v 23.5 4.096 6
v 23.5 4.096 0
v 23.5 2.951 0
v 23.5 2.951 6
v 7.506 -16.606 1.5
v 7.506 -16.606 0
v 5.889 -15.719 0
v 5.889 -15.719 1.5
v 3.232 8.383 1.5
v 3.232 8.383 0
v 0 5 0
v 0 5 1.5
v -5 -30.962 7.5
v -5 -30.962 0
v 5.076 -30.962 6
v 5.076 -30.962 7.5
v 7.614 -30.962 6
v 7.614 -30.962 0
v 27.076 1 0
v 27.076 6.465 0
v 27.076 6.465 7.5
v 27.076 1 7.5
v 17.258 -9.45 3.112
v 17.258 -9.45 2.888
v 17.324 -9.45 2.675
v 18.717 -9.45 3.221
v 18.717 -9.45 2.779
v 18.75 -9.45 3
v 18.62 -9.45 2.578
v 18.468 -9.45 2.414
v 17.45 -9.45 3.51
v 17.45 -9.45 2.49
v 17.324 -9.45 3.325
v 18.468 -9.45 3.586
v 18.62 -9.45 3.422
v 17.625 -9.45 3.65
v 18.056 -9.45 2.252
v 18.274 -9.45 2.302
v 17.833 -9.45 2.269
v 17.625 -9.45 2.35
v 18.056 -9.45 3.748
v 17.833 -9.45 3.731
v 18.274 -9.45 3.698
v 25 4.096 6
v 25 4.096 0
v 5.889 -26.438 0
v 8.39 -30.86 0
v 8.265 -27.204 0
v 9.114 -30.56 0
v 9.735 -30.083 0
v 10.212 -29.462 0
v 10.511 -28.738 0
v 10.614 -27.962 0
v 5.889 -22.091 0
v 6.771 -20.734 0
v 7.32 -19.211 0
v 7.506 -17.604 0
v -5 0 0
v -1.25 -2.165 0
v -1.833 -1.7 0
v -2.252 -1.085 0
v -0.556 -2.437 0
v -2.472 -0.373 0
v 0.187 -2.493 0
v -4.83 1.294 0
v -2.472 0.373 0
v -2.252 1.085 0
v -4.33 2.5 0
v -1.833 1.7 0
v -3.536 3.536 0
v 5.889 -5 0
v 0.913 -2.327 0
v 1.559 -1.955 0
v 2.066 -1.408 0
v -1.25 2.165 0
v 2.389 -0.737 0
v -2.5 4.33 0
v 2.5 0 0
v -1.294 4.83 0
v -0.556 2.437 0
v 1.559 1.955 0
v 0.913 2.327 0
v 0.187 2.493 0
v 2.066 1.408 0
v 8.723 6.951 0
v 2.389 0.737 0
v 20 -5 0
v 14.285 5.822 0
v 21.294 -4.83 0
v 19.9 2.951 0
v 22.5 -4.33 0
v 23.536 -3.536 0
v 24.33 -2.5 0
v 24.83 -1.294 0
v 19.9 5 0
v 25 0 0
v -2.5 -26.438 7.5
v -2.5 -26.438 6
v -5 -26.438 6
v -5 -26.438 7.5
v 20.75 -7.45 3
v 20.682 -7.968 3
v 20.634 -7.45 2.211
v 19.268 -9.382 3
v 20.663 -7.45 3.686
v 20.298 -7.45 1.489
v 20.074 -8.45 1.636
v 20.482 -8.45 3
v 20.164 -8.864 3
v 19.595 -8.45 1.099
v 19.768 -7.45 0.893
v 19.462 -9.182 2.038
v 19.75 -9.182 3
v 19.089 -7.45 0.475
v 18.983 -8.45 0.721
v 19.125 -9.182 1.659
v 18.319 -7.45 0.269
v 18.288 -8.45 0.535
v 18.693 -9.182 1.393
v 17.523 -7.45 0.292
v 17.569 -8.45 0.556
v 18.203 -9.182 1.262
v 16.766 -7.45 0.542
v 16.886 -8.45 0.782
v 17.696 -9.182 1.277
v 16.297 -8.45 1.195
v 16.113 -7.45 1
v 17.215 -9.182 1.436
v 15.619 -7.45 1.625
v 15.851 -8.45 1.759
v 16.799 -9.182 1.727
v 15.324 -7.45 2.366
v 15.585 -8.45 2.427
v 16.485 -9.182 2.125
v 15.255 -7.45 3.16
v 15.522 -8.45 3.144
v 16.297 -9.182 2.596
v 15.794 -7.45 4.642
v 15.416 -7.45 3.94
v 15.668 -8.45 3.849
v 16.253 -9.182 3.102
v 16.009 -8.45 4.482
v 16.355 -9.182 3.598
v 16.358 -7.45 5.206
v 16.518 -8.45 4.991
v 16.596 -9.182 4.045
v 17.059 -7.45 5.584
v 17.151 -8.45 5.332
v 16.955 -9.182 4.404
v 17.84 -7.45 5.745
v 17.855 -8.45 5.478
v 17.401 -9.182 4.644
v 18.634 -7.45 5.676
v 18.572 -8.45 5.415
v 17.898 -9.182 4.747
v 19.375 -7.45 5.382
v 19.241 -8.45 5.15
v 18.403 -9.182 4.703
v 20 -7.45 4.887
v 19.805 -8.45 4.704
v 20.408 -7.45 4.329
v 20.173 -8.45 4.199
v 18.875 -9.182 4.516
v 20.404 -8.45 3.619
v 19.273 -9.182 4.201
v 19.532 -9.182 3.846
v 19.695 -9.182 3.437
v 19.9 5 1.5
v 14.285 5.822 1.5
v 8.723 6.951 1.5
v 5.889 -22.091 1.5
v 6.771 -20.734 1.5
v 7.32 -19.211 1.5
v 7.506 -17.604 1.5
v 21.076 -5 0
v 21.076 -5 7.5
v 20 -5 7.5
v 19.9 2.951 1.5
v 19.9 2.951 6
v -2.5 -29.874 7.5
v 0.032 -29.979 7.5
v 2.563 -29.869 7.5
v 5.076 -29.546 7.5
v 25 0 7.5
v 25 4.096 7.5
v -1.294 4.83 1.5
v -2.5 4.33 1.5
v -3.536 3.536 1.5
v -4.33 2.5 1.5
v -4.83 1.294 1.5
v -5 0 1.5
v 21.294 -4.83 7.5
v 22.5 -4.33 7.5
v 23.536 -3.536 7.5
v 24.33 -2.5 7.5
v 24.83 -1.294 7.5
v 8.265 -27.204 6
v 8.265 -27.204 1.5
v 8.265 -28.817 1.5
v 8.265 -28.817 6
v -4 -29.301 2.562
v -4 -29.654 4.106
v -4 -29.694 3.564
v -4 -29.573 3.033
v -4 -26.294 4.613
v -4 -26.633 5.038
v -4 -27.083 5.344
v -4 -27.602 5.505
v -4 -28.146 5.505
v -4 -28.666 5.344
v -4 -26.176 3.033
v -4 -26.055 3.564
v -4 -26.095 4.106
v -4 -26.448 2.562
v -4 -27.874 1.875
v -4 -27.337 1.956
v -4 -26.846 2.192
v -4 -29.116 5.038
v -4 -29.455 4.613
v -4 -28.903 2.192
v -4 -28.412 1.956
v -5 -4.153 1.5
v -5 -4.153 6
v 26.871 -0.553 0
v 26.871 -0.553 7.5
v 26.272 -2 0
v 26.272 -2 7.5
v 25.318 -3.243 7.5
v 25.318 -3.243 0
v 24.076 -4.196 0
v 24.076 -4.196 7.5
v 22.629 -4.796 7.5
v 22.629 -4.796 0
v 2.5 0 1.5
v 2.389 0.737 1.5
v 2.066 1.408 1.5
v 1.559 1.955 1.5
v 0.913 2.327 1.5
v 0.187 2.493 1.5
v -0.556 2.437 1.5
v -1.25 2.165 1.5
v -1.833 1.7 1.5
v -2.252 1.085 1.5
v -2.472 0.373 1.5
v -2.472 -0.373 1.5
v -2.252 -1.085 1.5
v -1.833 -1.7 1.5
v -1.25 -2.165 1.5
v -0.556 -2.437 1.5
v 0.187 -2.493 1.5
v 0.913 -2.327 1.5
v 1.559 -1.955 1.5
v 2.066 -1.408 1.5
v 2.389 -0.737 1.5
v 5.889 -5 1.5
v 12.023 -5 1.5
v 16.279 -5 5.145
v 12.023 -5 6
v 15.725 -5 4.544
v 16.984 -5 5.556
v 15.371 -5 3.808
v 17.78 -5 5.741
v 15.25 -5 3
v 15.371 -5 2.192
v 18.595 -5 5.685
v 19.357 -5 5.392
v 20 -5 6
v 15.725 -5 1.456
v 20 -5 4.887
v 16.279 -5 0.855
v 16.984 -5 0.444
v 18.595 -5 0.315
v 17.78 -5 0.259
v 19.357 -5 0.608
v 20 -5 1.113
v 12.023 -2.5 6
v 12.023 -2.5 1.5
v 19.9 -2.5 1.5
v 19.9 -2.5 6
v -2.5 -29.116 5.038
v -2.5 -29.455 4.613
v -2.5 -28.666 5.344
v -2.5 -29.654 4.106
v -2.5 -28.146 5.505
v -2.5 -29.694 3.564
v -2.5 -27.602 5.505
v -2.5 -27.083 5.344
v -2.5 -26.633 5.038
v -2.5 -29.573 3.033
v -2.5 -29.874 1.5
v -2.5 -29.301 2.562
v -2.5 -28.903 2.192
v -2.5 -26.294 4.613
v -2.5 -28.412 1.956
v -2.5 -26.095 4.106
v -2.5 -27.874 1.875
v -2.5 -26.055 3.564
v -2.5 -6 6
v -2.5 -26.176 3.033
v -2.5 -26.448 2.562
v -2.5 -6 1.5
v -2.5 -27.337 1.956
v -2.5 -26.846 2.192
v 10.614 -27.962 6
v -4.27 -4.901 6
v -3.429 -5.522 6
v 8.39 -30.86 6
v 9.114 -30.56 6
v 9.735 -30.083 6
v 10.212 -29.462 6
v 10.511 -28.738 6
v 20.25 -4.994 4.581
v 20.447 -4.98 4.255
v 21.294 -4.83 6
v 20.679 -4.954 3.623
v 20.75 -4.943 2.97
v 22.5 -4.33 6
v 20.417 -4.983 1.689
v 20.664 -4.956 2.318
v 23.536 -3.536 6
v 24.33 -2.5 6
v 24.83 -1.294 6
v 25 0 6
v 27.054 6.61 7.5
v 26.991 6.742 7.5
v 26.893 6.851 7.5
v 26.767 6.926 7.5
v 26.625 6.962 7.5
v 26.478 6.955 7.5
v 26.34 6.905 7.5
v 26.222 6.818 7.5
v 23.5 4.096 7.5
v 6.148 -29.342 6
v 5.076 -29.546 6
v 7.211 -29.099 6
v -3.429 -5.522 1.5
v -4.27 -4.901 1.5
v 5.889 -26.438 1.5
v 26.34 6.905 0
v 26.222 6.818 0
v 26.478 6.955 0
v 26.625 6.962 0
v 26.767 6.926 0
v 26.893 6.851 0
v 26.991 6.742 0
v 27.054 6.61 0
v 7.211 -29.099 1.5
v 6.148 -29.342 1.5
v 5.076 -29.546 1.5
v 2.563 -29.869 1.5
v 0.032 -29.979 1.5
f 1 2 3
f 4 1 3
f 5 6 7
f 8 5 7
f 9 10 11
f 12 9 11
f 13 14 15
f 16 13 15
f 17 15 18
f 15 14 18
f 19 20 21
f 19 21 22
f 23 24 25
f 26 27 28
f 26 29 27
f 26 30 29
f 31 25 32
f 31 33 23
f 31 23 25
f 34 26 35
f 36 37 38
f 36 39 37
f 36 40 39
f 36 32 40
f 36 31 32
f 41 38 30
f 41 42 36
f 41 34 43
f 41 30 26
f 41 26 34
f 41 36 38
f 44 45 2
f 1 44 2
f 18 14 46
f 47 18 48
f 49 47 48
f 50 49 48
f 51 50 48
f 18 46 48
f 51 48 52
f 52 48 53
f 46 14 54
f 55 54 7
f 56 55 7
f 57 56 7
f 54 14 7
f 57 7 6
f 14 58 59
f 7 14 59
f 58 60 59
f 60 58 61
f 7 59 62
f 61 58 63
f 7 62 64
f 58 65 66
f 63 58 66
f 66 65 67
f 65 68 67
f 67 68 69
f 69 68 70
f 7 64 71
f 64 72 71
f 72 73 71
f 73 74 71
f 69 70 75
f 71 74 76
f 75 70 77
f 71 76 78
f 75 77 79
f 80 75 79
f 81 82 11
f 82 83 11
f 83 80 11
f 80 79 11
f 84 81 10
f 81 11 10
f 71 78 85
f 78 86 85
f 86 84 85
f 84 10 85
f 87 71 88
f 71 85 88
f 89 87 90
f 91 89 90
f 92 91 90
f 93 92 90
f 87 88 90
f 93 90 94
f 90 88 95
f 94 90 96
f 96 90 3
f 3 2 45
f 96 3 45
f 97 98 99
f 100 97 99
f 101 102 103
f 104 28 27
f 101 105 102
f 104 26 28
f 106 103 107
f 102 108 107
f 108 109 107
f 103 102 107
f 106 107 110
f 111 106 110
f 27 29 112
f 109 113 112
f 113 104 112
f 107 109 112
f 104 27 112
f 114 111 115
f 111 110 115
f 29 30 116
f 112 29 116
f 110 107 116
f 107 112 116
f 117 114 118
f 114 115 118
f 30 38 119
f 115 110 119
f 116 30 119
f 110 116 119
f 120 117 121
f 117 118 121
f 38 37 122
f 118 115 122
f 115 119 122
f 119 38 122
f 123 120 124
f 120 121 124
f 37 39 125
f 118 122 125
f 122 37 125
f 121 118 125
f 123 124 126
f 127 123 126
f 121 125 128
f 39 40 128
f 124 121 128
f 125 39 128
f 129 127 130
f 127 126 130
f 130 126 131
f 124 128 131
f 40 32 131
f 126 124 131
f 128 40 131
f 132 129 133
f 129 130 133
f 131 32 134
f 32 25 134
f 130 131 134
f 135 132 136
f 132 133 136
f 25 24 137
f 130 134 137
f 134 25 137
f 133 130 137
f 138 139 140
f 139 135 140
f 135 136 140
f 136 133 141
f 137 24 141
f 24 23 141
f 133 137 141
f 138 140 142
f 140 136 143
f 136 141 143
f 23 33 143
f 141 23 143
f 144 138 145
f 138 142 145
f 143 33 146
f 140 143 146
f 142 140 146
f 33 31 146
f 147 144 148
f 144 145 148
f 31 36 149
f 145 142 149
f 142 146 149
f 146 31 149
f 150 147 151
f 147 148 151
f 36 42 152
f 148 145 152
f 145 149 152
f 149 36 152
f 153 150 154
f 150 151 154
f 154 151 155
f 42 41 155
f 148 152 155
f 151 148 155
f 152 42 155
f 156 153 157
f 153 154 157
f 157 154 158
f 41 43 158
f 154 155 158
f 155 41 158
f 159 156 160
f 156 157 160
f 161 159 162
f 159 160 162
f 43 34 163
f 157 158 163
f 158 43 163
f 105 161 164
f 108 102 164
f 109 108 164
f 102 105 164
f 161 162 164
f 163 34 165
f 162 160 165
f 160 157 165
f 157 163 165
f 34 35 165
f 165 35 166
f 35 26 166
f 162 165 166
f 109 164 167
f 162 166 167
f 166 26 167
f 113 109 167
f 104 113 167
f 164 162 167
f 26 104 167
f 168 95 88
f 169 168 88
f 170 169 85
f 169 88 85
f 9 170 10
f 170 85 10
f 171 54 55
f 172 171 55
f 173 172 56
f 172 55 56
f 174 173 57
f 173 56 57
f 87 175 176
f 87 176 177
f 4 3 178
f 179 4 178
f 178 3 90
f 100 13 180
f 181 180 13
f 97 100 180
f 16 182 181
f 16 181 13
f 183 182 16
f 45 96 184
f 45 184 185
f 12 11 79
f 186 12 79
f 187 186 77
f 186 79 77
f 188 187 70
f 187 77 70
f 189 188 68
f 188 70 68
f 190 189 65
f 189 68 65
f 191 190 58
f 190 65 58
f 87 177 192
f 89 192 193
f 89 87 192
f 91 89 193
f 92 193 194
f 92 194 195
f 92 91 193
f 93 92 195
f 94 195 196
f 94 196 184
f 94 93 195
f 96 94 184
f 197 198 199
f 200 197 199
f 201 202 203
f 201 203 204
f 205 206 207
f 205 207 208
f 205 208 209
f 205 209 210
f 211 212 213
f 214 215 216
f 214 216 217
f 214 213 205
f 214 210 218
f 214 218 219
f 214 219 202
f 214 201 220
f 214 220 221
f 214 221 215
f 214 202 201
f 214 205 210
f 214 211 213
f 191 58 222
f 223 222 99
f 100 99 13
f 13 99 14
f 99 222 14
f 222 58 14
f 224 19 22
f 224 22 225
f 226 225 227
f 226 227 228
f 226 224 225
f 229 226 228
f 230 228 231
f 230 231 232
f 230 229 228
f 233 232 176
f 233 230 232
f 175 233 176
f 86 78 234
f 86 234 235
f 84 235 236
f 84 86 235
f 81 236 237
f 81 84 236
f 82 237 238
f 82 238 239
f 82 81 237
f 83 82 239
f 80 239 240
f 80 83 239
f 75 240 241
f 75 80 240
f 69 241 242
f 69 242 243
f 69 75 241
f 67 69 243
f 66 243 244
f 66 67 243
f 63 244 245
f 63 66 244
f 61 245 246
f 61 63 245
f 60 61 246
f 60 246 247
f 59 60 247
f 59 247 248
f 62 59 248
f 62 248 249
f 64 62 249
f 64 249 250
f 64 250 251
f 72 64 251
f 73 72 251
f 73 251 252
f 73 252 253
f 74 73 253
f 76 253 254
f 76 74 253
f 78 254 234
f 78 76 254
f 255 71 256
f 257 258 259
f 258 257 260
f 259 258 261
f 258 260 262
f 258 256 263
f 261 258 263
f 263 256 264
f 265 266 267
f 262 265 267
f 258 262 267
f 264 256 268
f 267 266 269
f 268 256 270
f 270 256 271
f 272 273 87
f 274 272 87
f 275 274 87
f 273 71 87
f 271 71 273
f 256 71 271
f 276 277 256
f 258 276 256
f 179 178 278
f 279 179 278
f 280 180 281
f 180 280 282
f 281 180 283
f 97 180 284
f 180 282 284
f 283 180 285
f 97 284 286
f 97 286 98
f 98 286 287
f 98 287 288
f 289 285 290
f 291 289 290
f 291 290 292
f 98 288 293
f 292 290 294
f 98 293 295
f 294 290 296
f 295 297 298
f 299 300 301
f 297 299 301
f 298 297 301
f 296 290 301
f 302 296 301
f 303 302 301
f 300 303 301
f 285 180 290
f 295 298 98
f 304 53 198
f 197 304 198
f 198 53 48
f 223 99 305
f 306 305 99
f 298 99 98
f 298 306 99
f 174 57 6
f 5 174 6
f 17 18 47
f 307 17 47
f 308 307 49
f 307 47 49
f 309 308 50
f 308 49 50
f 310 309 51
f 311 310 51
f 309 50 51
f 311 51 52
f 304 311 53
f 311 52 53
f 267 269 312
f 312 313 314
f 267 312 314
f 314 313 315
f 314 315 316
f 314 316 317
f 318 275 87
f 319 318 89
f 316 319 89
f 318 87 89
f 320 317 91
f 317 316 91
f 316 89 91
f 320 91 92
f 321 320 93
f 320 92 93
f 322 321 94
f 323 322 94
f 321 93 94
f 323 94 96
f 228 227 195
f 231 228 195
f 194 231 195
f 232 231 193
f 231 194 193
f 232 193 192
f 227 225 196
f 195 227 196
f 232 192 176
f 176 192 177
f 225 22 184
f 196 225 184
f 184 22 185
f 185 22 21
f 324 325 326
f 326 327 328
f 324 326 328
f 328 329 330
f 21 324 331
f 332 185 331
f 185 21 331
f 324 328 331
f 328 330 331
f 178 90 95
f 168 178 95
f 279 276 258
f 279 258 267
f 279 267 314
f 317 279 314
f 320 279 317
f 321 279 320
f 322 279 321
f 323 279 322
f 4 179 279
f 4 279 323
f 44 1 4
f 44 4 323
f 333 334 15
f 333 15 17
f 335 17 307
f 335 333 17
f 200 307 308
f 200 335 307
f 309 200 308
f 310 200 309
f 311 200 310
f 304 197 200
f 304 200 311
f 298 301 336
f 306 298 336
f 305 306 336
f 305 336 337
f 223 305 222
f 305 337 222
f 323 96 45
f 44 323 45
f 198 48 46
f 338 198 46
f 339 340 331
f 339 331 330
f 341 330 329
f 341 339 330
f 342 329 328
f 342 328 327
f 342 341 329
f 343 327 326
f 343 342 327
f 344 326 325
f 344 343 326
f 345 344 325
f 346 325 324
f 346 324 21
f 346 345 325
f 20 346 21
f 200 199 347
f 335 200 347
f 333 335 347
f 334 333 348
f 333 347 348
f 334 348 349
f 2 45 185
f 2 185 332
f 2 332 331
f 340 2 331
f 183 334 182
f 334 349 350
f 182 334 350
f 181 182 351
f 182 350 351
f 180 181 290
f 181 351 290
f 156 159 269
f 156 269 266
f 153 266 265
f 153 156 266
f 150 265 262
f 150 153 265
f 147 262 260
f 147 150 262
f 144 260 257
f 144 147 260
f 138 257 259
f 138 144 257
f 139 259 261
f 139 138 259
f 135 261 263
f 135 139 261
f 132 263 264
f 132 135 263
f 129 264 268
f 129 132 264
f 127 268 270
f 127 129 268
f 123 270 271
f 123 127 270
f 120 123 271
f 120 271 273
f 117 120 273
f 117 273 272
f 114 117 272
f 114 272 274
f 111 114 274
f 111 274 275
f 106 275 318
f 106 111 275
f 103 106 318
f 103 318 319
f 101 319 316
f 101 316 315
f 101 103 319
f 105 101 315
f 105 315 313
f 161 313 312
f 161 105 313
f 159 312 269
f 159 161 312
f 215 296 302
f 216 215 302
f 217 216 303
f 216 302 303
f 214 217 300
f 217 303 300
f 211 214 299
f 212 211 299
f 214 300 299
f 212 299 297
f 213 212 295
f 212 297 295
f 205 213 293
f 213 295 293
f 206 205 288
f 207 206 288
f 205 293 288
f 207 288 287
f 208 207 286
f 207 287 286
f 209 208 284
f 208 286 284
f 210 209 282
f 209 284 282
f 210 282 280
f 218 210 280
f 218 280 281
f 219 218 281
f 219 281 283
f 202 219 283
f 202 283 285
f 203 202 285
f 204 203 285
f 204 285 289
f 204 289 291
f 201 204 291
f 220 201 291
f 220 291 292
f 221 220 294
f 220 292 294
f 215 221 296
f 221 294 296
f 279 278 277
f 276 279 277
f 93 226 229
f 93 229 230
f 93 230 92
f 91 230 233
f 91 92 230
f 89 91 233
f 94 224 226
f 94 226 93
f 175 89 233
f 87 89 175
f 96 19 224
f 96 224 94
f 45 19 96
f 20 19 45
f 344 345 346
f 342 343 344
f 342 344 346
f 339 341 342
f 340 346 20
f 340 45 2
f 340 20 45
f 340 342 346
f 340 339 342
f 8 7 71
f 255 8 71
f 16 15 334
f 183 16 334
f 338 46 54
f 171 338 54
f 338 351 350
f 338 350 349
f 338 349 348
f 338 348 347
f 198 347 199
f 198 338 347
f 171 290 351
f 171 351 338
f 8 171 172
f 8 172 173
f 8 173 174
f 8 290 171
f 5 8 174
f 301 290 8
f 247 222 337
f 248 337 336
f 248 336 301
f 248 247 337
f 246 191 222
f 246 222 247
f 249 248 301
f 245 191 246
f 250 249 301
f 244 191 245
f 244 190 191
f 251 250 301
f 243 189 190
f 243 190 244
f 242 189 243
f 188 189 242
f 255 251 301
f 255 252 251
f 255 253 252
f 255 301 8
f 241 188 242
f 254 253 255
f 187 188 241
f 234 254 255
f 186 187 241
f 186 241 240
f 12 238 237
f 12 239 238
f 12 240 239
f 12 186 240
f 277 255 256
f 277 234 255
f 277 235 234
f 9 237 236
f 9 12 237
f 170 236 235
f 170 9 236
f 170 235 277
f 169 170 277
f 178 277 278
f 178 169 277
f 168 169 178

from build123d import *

# Parameters (mm, degrees)
EXTRUDE_3_DEPTH     = 7.5
EXTRUDE_3_2_DEPTH   = 7.5
EXTRUDE_4_DEPTH     = 6
SKETCH_1_8_R        = 2.5
EXTRUDE_5_DEPTH     = 1.5
SKETCH_2_R          = 2.75
EXTRUDE_6_DEPTH     = 2.45
SKETCH_4_R          = 2.75
EXTRUDE_7_DEPTH     = 2
SKETCH_5_R          = 1.825
CUT_EXTRUDE_1_DEPTH = 1.5


with BuildPart() as part:
    # 스케치1 → 보스-돌출3 (new body)
    with BuildSketch(Plane.XY):
        with BuildLine():
            Line((-2.5, -26.437677825), (-5, -26.437677825))
            Line((-5, -26.437677825), (-5, -30.96175738))
            Line((-5, -30.96175738), (5.076141326, -30.96175738))
            Line((5.076141326, -30.96175738), (5.076141326, -29.54601506))
            ThreePointArc((5.076141326, -29.54601506), (1.298498135, -29.950761581), (-2.5, -29.874474333))
            Line((-2.5, -29.874474333), (-2.5, -26.437677825))
        make_face()
    extrude(amount=EXTRUDE_3_DEPTH)

    # 스케치1<7> → 보스-돌출4 (add)
    with BuildSketch(Plane.XY):
        with BuildLine():
            Line((23.5, 2.950728465), (19.9, 2.950728465))
            Line((19.9, 2.950728465), (19.9, -2.5))
            Line((19.9, -2.5), (12.023157318, -2.5))
            Line((12.023157318, -2.5), (12.023157318, -5))
            Line((12.023157318, -5), (20, -5))
            ThreePointArc((20, -5), (23.535533906, -3.535533906), (25, 0))
            Line((25, 0), (25, 4.09591659))
            Line((25, 4.09591659), (23.5, 4.09591659))
            Line((23.5, 4.09591659), (23.5, 2.950728465))
        make_face()
        with BuildLine():
            ThreePointArc((-2.5, -6), (-3.862002616, -5.228282299), (-5, -4.153311931))
            Line((-5, -4.153311931), (-5, -26.437677825))
            Line((-5, -26.437677825), (-2.5, -26.437677825))
            Line((-2.5, -26.437677825), (-2.5, -6))
        make_face()
        with BuildLine():
            Line((5.076141326, -29.54601506), (5.076141326, -30.96175738))
            Line((5.076141326, -30.96175738), (7.613716386, -30.96175738))
            ThreePointArc((7.613716386, -30.96175738), (9.735036729, -30.083077723), (10.613716386, -27.96175738))
            Line((10.613716386, -27.96175738), (8.264928228, -27.20398111))
            Line((8.264928228, -27.20398111), (8.264928228, -28.81709871))
            ThreePointArc((8.264928228, -28.81709871), (6.680483813, -29.225080884), (5.076141326, -29.54601506))
        make_face()
    extrude(amount=EXTRUDE_4_DEPTH)


with BuildPart() as body_2:
    # 스케치1 → Extrude 3 2 (new body)
    with BuildSketch(Plane.XY):
        with BuildLine():
            ThreePointArc((26.22215467, 6.81807126), (26.767049777, 6.926457636), (27.075708061, 6.46451787))
            Line((27.075708061, 6.46451787), (27.075708061, 1))
            ThreePointArc((27.075708061, 1), (25.318348748, -3.242640687), (21.075708061, -5))
            Line((21.075708061, -5), (20, -5))
            ThreePointArc((20, -5), (23.535533906, -3.535533906), (25, 0))
            Line((25, 0), (25, 4.09591659))
            Line((25, 4.09591659), (23.5, 4.09591659))
            Line((23.5, 4.09591659), (26.22215467, 6.81807126))
        make_face()
    extrude(amount=EXTRUDE_3_2_DEPTH)


with BuildPart() as extrude_4_piece_1:
    # of the separate pieces the step leaves, piece 1, a body of its own (extrude_4_pieces)
    add(part.part.solids().sort_by_distance((-2.5, -29.874474333, 0))[0])



with BuildPart() as extrude_4_piece_2:
    # of the separate pieces the step leaves, piece 2, a body of its own (extrude_4_pieces)
    add(part.part.solids().sort_by_distance((23.5, 2.950728465, 0))[0])


with BuildPart() as extrude_4_piece_1_1:
    add(extrude_4_piece_1.part)

    add(extrude_4_piece_2.part)  # 보스-돌출5 merges 보스-돌출4 piece 2
    # 스케치1<8> → 보스-돌출5 (add)
    with BuildSketch(Plane.XY):
        with BuildLine():
            Line((3.231912185, 8.38327913), (0, 5))
            ThreePointArc((0, 5), (-3.535533906, 3.535533906), (-5, 0))
            Line((-5, 0), (-5, -4.153311931))
            ThreePointArc((-5, -4.153311931), (-3.862002616, -5.228282299), (-2.5, -6))
            Line((-2.5, -6), (-2.5, -29.874474333))
            ThreePointArc((-2.5, -29.874474333), (2.93054776, -29.83531643), (8.264928228, -28.81709871))
            Line((8.264928228, -28.81709871), (8.264928228, -27.20398111))
            Line((8.264928228, -27.20398111), (5.889404941, -26.437579436))
            Line((5.889404941, -26.437579436), (5.889404941, -22.090836604))
            ThreePointArc((5.889404941, -22.090836604), (7.089676261, -19.98856225), (7.506209453, -17.603880133))
            Line((7.506209453, -17.603880133), (7.506209453, -16.606122356))
            Line((7.506209453, -16.606122356), (5.889404941, -15.718789718))
            Line((5.889404941, -15.718789718), (5.889404941, -5))
            Line((5.889404941, -5), (12.023157318, -5))
            Line((12.023157318, -5), (12.023157318, -2.5))
            Line((12.023157318, -2.5), (19.9, -2.5))
            Line((19.9, -2.5), (19.9, 5))
            ThreePointArc((19.9, 5), (11.496170313, 6.34783243), (3.231912185, 8.38327913))
        make_face()
        Circle(SKETCH_1_8_R, mode=Mode.SUBTRACT)
    extrude(amount=EXTRUDE_5_DEPTH)

    # 스케치2 → 보스-돌출6 (add, symmetric)
    with BuildSketch(Plane.XZ.offset(5)):
        with Locations(Location((18, 3, 0), (0, 0, 43.341758227))):
            Circle(SKETCH_2_R)
    extrude(amount=EXTRUDE_6_DEPTH, both=True)

    # 스케치4 → 보스-돌출7 (add)
    with BuildSketch(Plane.XZ.offset(7.45)):
        with Locations(Location((18, 3, 0), (0, 0, 43.341758227))):
            Circle(SKETCH_4_R)
    extrude(amount=EXTRUDE_7_DEPTH)

    # 스케치5 → 컷-돌출1 (cut)
    with BuildSketch(Plane(origin=(-2.5, 0, 0), x_dir=(0, 0, -1), z_dir=(1, 0, 0))):
        with Locations((-3.7, -27.874474333)):
            Circle(SKETCH_5_R)
    extrude(amount=-CUT_EXTRUDE_1_DEPTH, mode=Mode.SUBTRACT)

    # 필렛1: read off the stored shape, not the designer's step
    # 필렛1 outline → 필렛1 (revolve, cut)
    with BuildSketch(Plane(origin=(18, 0, 3), x_dir=(1, 0, 0), z_dir=(0, 0, 1))):
        with BuildLine():
            Line((2.75, -9.45), (2.75, -7.45))
            ThreePointArc((2.75, -7.45), (2.164213562, -8.864213562), (0.75, -9.45))
            Line((0.75, -9.45), (2.75, -9.45))
        make_face()
    revolve(axis=Axis((18, 0, 3), (0, 1, 0)), mode=Mode.SUBTRACT)


solid = Compound([body_2.part, extrude_4_piece_1_1.part])
